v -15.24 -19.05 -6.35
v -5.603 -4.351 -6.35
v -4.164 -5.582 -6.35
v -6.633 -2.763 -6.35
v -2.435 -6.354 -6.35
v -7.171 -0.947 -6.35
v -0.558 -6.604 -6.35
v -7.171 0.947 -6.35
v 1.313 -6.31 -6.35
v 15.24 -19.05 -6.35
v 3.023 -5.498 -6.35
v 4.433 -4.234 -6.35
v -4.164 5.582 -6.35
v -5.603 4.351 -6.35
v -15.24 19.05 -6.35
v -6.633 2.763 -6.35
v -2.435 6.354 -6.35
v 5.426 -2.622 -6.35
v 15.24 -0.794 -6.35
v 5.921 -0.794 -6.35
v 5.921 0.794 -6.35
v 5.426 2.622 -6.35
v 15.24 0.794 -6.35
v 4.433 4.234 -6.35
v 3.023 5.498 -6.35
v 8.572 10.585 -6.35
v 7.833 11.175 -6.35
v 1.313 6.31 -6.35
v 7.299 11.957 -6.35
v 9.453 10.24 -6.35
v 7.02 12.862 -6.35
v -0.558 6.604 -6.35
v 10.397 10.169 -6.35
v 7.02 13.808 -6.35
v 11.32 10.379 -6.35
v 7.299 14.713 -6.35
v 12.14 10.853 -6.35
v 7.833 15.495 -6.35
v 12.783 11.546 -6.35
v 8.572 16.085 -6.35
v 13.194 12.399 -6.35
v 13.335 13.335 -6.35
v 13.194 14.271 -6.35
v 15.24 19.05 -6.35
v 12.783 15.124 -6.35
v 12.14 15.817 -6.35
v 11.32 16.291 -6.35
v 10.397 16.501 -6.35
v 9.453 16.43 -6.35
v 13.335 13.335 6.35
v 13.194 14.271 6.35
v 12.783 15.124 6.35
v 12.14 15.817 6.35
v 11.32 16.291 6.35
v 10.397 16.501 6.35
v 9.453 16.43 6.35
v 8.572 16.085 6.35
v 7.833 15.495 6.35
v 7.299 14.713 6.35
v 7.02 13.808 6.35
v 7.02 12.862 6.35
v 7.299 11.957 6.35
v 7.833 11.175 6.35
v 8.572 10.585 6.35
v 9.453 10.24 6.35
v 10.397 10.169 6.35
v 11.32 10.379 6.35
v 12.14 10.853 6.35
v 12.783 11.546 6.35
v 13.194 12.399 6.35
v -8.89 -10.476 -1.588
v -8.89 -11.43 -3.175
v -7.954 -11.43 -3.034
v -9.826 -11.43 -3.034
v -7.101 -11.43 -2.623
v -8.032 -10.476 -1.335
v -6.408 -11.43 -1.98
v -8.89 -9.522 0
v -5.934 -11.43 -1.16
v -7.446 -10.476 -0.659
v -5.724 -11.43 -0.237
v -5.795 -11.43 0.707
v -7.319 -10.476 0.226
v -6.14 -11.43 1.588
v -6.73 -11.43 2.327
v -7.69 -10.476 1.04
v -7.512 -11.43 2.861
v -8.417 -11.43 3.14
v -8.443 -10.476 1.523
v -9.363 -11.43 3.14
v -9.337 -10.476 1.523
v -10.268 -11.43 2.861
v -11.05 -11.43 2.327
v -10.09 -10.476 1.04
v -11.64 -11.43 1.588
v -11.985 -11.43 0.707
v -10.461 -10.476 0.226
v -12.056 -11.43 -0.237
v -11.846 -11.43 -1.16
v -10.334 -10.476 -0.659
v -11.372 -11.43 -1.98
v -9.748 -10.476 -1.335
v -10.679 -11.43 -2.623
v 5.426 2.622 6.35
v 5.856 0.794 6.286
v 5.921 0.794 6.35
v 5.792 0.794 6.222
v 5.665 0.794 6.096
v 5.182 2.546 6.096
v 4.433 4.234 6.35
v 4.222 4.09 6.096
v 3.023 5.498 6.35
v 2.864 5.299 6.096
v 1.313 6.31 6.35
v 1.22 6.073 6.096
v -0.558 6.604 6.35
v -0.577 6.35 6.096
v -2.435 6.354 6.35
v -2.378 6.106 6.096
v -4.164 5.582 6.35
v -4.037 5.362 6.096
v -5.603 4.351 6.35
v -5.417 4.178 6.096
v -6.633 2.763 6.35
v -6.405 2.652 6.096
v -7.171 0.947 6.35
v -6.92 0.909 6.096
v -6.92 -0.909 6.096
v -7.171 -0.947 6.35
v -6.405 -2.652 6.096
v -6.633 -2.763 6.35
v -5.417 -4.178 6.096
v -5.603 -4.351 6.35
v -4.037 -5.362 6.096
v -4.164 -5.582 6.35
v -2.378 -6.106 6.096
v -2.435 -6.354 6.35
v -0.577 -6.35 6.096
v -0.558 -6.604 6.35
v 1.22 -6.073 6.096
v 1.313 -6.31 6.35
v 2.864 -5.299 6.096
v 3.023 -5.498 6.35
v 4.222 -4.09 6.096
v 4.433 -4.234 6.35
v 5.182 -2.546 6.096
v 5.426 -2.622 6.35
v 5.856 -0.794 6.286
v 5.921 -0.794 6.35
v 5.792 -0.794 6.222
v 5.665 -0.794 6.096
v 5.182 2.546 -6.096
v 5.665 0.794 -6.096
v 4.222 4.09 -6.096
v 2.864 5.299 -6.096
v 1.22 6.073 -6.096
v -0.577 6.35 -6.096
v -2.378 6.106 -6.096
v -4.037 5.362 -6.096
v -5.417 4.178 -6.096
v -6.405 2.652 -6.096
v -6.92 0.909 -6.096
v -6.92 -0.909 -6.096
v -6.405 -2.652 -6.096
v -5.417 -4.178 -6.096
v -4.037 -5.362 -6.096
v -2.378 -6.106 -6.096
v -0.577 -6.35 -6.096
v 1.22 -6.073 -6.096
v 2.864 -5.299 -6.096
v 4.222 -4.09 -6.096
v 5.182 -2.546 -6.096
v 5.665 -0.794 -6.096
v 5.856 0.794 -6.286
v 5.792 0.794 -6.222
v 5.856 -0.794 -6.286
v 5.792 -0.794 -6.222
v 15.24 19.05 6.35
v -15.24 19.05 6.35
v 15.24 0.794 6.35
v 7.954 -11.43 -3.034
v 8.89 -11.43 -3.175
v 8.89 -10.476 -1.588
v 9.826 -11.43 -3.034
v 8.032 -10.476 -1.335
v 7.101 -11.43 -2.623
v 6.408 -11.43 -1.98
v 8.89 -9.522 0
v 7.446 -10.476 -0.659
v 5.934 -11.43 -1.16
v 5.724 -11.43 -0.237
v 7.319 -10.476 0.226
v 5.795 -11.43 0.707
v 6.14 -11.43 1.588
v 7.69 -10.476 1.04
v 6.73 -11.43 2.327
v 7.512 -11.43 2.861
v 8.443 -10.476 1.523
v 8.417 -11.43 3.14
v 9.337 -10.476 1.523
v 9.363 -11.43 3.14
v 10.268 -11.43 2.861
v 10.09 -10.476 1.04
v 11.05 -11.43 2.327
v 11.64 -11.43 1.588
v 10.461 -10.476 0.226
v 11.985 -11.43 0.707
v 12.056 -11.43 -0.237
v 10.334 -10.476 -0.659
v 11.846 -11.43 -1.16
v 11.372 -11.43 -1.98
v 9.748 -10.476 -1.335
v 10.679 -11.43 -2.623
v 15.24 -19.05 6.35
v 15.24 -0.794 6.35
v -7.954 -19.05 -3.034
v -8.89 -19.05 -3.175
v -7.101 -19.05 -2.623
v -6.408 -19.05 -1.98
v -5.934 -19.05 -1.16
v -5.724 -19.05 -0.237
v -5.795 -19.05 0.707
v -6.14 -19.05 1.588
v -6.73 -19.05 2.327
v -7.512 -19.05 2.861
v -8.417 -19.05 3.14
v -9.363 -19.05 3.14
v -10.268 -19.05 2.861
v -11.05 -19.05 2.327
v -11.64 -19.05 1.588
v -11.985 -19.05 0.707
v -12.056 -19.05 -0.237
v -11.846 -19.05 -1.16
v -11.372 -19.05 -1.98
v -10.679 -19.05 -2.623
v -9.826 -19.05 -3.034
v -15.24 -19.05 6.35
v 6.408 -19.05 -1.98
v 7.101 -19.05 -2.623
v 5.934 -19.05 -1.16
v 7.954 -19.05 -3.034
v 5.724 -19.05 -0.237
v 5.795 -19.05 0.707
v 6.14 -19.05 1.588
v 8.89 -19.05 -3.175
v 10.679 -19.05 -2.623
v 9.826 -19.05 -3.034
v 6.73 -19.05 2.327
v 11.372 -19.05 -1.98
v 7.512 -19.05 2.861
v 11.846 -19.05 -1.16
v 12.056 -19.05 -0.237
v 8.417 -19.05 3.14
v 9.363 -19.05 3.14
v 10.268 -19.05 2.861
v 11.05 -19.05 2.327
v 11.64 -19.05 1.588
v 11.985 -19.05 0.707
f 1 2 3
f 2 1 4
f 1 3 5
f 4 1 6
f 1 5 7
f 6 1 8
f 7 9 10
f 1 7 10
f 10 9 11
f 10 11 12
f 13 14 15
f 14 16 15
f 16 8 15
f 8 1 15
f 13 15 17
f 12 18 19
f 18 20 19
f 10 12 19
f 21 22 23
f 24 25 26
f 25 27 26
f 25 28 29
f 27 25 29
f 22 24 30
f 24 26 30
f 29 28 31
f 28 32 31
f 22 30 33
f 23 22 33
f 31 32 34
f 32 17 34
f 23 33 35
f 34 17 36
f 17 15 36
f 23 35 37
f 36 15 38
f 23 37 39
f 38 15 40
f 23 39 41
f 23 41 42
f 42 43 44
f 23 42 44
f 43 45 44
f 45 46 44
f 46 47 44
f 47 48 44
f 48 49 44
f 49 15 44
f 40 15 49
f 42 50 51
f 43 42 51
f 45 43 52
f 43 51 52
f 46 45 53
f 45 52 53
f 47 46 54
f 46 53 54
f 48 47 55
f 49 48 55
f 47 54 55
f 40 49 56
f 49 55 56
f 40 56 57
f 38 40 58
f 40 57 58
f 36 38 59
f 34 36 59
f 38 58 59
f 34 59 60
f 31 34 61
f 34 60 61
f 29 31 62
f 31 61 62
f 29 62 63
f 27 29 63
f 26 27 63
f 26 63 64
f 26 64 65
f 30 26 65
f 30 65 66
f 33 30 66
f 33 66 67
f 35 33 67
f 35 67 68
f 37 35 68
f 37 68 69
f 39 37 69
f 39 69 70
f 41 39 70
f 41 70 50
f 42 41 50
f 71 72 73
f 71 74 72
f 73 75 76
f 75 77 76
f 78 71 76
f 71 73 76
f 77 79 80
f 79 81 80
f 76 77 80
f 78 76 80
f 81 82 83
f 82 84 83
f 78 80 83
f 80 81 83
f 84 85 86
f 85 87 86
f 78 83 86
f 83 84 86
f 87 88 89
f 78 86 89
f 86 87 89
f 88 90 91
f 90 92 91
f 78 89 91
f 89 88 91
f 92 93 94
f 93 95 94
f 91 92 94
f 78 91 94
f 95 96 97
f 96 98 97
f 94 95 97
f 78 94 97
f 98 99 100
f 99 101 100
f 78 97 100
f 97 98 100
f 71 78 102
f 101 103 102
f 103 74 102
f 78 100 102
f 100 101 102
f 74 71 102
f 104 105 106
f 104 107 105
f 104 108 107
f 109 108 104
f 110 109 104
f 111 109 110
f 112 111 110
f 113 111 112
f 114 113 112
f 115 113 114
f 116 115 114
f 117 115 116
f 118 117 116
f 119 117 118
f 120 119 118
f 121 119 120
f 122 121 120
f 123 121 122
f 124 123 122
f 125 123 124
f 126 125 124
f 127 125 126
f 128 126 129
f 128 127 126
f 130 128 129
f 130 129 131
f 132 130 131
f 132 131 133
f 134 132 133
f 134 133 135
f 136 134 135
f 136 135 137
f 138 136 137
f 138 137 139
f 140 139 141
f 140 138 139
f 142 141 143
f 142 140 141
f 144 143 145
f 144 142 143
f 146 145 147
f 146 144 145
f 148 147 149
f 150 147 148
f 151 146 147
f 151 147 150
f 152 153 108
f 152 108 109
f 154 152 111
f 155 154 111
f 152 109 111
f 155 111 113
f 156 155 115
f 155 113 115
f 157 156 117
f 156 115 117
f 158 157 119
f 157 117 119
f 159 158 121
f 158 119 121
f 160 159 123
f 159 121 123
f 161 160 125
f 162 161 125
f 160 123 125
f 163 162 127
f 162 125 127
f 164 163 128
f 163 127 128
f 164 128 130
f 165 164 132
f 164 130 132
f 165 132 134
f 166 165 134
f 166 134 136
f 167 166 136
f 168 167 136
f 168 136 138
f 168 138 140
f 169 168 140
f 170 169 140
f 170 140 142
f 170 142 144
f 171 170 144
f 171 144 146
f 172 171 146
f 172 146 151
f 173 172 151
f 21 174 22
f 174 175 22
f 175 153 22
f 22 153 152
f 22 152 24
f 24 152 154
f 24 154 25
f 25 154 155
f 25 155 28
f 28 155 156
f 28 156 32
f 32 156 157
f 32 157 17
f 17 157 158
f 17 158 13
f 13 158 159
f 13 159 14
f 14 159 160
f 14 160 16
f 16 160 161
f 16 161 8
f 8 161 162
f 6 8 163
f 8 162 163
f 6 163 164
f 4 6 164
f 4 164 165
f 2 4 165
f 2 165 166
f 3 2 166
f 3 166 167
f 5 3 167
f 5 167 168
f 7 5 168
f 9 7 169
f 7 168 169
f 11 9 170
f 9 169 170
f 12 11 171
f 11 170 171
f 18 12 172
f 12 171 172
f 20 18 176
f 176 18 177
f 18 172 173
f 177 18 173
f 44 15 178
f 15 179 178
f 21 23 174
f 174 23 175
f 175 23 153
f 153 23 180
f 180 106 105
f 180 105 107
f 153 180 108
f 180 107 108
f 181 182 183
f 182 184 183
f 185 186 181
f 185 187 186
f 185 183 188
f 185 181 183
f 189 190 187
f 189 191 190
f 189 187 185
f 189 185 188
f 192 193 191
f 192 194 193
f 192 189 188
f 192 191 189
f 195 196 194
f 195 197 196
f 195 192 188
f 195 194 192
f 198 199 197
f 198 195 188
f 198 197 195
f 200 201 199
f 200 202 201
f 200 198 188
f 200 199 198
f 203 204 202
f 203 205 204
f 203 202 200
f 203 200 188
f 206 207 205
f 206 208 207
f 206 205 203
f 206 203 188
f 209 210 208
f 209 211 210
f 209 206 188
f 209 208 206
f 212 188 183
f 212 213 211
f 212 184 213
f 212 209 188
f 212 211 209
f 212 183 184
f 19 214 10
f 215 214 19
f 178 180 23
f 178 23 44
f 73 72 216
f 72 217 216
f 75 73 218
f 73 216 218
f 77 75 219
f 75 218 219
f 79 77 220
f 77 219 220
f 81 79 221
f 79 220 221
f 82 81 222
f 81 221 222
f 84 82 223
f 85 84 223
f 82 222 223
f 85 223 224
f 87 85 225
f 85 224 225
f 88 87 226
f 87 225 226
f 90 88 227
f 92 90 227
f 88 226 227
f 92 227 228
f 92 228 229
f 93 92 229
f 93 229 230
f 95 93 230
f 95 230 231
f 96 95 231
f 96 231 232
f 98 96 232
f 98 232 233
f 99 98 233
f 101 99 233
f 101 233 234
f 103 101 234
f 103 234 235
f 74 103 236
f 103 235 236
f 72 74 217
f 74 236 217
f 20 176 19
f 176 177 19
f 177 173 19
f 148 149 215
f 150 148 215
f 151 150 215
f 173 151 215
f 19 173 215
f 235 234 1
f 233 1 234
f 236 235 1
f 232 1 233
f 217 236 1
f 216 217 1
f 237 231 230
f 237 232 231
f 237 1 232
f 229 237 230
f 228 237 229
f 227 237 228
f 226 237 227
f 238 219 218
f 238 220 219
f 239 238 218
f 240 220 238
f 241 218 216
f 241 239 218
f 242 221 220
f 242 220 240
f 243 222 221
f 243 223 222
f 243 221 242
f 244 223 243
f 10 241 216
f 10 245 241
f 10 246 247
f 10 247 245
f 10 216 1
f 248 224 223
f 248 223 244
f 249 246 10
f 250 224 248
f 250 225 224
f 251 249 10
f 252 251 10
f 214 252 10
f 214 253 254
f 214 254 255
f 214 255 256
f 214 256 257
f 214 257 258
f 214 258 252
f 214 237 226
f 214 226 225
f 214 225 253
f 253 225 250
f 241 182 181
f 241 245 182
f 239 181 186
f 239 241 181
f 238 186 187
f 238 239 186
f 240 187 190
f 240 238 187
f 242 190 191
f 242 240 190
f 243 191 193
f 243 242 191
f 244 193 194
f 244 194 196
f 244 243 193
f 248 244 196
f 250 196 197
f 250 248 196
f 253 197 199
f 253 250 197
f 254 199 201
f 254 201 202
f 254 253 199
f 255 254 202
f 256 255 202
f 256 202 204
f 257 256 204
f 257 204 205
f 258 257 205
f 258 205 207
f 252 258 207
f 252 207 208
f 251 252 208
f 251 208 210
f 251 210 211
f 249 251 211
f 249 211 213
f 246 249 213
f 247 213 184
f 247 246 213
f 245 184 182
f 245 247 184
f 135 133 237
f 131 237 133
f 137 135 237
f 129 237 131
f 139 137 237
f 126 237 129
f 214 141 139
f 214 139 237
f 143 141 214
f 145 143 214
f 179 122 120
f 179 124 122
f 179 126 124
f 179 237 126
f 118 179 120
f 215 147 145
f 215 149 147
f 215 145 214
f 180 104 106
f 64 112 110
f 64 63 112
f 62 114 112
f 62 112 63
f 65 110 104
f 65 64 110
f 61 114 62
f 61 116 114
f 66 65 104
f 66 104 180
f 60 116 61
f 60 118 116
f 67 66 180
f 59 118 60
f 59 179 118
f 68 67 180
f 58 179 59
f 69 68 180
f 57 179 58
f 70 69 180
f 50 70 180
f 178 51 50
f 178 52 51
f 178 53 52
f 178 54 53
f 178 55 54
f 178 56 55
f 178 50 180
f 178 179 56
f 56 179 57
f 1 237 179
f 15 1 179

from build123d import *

# Parameters (mm, degrees)
SKETCH1_W           = 30.48
SKETCH1_H           = 38.1
BOSS_EXTRUDE1_DEPTH = 6.35
CUT_EXTRUDE2_DEPTH  = 13.7
CHAMFER1_SIZE       = 0.254
SKETCH8_R           = 3.175
CUT_EXTRUDE4_DEPTH  = 13.7


with BuildPart() as part:
    # Sketch1 → Boss-Extrude1 (new body, symmetric)
    with BuildSketch(Plane.XY):
        Rectangle(SKETCH1_W, SKETCH1_H)
    extrude(amount=BOSS_EXTRUDE1_DEPTH, both=True)

    # Sketch2 → Cut-Extrude2 (cut, through all)
    with BuildSketch(Plane.XY.offset(6.35)):
        with BuildLine():
            Line((97.980767498, 0.79375), (15.24, 0.79375))
            Line((15.24, 0.79375), (5.665195309, 0.79375))
            ThreePointArc((5.665195309, 0.79375), (-6.985, 0), (5.665195309, -0.79375))
            Line((5.665195309, -0.79375), (15.24, -0.79375))
            Line((15.24, -0.79375), (97.980767498, -0.79375))
            Line((97.980767498, -0.79375), (263.462302495, -0.79375))
            Line((263.462302495, -0.79375), (263.462302495, 0.79375))
            Line((263.462302495, 0.79375), (97.980767498, 0.79375))
        make_face()
    extrude(amount=-CUT_EXTRUDE2_DEPTH, mode=Mode.SUBTRACT)

    # Sketch6 → 1/4 (0.25) Diameter Hole1 (revolve, cut)
    with BuildSketch(Plane(origin=(8.89, -19.05, 0), x_dir=(0, 0, -1), z_dir=(1, 0, 0))):
        Polygon((0, 0), (0, 9.527732465), (3.175, 7.62), (3.175, 0), align=None)
    f_1_4_0_25_diameter_hole1 = revolve(axis=Axis((8.89, -25.4, 0), (0, 1, 0)), mode=Mode.SUBTRACT)

    # Chamfer1
    chamfer1_edges = [part.edges().sort_by_distance(p)[0] for p in [
        (-6.985, 0, -6.35),
        (-6.985, 0, 6.35),
    ]]
    chamfer(chamfer1_edges, length=CHAMFER1_SIZE)

    # Mirror1: 1/4 (0.25) Diameter Hole1 across plane
    add(f_1_4_0_25_diameter_hole1.mirror(Plane(origin=(0, 0, 0), x_dir=(0, 0, 1), z_dir=(1, 0, 0))), mode=Mode.SUBTRACT)

    # Sketch8 → Cut-Extrude4 (cut, through all)
    with BuildSketch(Plane.XY.offset(6.35)):
        with Locations((10.16, 13.335)):
            Circle(SKETCH8_R)
    extrude(amount=-CUT_EXTRUDE4_DEPTH, mode=Mode.SUBTRACT)


solid = part.part
